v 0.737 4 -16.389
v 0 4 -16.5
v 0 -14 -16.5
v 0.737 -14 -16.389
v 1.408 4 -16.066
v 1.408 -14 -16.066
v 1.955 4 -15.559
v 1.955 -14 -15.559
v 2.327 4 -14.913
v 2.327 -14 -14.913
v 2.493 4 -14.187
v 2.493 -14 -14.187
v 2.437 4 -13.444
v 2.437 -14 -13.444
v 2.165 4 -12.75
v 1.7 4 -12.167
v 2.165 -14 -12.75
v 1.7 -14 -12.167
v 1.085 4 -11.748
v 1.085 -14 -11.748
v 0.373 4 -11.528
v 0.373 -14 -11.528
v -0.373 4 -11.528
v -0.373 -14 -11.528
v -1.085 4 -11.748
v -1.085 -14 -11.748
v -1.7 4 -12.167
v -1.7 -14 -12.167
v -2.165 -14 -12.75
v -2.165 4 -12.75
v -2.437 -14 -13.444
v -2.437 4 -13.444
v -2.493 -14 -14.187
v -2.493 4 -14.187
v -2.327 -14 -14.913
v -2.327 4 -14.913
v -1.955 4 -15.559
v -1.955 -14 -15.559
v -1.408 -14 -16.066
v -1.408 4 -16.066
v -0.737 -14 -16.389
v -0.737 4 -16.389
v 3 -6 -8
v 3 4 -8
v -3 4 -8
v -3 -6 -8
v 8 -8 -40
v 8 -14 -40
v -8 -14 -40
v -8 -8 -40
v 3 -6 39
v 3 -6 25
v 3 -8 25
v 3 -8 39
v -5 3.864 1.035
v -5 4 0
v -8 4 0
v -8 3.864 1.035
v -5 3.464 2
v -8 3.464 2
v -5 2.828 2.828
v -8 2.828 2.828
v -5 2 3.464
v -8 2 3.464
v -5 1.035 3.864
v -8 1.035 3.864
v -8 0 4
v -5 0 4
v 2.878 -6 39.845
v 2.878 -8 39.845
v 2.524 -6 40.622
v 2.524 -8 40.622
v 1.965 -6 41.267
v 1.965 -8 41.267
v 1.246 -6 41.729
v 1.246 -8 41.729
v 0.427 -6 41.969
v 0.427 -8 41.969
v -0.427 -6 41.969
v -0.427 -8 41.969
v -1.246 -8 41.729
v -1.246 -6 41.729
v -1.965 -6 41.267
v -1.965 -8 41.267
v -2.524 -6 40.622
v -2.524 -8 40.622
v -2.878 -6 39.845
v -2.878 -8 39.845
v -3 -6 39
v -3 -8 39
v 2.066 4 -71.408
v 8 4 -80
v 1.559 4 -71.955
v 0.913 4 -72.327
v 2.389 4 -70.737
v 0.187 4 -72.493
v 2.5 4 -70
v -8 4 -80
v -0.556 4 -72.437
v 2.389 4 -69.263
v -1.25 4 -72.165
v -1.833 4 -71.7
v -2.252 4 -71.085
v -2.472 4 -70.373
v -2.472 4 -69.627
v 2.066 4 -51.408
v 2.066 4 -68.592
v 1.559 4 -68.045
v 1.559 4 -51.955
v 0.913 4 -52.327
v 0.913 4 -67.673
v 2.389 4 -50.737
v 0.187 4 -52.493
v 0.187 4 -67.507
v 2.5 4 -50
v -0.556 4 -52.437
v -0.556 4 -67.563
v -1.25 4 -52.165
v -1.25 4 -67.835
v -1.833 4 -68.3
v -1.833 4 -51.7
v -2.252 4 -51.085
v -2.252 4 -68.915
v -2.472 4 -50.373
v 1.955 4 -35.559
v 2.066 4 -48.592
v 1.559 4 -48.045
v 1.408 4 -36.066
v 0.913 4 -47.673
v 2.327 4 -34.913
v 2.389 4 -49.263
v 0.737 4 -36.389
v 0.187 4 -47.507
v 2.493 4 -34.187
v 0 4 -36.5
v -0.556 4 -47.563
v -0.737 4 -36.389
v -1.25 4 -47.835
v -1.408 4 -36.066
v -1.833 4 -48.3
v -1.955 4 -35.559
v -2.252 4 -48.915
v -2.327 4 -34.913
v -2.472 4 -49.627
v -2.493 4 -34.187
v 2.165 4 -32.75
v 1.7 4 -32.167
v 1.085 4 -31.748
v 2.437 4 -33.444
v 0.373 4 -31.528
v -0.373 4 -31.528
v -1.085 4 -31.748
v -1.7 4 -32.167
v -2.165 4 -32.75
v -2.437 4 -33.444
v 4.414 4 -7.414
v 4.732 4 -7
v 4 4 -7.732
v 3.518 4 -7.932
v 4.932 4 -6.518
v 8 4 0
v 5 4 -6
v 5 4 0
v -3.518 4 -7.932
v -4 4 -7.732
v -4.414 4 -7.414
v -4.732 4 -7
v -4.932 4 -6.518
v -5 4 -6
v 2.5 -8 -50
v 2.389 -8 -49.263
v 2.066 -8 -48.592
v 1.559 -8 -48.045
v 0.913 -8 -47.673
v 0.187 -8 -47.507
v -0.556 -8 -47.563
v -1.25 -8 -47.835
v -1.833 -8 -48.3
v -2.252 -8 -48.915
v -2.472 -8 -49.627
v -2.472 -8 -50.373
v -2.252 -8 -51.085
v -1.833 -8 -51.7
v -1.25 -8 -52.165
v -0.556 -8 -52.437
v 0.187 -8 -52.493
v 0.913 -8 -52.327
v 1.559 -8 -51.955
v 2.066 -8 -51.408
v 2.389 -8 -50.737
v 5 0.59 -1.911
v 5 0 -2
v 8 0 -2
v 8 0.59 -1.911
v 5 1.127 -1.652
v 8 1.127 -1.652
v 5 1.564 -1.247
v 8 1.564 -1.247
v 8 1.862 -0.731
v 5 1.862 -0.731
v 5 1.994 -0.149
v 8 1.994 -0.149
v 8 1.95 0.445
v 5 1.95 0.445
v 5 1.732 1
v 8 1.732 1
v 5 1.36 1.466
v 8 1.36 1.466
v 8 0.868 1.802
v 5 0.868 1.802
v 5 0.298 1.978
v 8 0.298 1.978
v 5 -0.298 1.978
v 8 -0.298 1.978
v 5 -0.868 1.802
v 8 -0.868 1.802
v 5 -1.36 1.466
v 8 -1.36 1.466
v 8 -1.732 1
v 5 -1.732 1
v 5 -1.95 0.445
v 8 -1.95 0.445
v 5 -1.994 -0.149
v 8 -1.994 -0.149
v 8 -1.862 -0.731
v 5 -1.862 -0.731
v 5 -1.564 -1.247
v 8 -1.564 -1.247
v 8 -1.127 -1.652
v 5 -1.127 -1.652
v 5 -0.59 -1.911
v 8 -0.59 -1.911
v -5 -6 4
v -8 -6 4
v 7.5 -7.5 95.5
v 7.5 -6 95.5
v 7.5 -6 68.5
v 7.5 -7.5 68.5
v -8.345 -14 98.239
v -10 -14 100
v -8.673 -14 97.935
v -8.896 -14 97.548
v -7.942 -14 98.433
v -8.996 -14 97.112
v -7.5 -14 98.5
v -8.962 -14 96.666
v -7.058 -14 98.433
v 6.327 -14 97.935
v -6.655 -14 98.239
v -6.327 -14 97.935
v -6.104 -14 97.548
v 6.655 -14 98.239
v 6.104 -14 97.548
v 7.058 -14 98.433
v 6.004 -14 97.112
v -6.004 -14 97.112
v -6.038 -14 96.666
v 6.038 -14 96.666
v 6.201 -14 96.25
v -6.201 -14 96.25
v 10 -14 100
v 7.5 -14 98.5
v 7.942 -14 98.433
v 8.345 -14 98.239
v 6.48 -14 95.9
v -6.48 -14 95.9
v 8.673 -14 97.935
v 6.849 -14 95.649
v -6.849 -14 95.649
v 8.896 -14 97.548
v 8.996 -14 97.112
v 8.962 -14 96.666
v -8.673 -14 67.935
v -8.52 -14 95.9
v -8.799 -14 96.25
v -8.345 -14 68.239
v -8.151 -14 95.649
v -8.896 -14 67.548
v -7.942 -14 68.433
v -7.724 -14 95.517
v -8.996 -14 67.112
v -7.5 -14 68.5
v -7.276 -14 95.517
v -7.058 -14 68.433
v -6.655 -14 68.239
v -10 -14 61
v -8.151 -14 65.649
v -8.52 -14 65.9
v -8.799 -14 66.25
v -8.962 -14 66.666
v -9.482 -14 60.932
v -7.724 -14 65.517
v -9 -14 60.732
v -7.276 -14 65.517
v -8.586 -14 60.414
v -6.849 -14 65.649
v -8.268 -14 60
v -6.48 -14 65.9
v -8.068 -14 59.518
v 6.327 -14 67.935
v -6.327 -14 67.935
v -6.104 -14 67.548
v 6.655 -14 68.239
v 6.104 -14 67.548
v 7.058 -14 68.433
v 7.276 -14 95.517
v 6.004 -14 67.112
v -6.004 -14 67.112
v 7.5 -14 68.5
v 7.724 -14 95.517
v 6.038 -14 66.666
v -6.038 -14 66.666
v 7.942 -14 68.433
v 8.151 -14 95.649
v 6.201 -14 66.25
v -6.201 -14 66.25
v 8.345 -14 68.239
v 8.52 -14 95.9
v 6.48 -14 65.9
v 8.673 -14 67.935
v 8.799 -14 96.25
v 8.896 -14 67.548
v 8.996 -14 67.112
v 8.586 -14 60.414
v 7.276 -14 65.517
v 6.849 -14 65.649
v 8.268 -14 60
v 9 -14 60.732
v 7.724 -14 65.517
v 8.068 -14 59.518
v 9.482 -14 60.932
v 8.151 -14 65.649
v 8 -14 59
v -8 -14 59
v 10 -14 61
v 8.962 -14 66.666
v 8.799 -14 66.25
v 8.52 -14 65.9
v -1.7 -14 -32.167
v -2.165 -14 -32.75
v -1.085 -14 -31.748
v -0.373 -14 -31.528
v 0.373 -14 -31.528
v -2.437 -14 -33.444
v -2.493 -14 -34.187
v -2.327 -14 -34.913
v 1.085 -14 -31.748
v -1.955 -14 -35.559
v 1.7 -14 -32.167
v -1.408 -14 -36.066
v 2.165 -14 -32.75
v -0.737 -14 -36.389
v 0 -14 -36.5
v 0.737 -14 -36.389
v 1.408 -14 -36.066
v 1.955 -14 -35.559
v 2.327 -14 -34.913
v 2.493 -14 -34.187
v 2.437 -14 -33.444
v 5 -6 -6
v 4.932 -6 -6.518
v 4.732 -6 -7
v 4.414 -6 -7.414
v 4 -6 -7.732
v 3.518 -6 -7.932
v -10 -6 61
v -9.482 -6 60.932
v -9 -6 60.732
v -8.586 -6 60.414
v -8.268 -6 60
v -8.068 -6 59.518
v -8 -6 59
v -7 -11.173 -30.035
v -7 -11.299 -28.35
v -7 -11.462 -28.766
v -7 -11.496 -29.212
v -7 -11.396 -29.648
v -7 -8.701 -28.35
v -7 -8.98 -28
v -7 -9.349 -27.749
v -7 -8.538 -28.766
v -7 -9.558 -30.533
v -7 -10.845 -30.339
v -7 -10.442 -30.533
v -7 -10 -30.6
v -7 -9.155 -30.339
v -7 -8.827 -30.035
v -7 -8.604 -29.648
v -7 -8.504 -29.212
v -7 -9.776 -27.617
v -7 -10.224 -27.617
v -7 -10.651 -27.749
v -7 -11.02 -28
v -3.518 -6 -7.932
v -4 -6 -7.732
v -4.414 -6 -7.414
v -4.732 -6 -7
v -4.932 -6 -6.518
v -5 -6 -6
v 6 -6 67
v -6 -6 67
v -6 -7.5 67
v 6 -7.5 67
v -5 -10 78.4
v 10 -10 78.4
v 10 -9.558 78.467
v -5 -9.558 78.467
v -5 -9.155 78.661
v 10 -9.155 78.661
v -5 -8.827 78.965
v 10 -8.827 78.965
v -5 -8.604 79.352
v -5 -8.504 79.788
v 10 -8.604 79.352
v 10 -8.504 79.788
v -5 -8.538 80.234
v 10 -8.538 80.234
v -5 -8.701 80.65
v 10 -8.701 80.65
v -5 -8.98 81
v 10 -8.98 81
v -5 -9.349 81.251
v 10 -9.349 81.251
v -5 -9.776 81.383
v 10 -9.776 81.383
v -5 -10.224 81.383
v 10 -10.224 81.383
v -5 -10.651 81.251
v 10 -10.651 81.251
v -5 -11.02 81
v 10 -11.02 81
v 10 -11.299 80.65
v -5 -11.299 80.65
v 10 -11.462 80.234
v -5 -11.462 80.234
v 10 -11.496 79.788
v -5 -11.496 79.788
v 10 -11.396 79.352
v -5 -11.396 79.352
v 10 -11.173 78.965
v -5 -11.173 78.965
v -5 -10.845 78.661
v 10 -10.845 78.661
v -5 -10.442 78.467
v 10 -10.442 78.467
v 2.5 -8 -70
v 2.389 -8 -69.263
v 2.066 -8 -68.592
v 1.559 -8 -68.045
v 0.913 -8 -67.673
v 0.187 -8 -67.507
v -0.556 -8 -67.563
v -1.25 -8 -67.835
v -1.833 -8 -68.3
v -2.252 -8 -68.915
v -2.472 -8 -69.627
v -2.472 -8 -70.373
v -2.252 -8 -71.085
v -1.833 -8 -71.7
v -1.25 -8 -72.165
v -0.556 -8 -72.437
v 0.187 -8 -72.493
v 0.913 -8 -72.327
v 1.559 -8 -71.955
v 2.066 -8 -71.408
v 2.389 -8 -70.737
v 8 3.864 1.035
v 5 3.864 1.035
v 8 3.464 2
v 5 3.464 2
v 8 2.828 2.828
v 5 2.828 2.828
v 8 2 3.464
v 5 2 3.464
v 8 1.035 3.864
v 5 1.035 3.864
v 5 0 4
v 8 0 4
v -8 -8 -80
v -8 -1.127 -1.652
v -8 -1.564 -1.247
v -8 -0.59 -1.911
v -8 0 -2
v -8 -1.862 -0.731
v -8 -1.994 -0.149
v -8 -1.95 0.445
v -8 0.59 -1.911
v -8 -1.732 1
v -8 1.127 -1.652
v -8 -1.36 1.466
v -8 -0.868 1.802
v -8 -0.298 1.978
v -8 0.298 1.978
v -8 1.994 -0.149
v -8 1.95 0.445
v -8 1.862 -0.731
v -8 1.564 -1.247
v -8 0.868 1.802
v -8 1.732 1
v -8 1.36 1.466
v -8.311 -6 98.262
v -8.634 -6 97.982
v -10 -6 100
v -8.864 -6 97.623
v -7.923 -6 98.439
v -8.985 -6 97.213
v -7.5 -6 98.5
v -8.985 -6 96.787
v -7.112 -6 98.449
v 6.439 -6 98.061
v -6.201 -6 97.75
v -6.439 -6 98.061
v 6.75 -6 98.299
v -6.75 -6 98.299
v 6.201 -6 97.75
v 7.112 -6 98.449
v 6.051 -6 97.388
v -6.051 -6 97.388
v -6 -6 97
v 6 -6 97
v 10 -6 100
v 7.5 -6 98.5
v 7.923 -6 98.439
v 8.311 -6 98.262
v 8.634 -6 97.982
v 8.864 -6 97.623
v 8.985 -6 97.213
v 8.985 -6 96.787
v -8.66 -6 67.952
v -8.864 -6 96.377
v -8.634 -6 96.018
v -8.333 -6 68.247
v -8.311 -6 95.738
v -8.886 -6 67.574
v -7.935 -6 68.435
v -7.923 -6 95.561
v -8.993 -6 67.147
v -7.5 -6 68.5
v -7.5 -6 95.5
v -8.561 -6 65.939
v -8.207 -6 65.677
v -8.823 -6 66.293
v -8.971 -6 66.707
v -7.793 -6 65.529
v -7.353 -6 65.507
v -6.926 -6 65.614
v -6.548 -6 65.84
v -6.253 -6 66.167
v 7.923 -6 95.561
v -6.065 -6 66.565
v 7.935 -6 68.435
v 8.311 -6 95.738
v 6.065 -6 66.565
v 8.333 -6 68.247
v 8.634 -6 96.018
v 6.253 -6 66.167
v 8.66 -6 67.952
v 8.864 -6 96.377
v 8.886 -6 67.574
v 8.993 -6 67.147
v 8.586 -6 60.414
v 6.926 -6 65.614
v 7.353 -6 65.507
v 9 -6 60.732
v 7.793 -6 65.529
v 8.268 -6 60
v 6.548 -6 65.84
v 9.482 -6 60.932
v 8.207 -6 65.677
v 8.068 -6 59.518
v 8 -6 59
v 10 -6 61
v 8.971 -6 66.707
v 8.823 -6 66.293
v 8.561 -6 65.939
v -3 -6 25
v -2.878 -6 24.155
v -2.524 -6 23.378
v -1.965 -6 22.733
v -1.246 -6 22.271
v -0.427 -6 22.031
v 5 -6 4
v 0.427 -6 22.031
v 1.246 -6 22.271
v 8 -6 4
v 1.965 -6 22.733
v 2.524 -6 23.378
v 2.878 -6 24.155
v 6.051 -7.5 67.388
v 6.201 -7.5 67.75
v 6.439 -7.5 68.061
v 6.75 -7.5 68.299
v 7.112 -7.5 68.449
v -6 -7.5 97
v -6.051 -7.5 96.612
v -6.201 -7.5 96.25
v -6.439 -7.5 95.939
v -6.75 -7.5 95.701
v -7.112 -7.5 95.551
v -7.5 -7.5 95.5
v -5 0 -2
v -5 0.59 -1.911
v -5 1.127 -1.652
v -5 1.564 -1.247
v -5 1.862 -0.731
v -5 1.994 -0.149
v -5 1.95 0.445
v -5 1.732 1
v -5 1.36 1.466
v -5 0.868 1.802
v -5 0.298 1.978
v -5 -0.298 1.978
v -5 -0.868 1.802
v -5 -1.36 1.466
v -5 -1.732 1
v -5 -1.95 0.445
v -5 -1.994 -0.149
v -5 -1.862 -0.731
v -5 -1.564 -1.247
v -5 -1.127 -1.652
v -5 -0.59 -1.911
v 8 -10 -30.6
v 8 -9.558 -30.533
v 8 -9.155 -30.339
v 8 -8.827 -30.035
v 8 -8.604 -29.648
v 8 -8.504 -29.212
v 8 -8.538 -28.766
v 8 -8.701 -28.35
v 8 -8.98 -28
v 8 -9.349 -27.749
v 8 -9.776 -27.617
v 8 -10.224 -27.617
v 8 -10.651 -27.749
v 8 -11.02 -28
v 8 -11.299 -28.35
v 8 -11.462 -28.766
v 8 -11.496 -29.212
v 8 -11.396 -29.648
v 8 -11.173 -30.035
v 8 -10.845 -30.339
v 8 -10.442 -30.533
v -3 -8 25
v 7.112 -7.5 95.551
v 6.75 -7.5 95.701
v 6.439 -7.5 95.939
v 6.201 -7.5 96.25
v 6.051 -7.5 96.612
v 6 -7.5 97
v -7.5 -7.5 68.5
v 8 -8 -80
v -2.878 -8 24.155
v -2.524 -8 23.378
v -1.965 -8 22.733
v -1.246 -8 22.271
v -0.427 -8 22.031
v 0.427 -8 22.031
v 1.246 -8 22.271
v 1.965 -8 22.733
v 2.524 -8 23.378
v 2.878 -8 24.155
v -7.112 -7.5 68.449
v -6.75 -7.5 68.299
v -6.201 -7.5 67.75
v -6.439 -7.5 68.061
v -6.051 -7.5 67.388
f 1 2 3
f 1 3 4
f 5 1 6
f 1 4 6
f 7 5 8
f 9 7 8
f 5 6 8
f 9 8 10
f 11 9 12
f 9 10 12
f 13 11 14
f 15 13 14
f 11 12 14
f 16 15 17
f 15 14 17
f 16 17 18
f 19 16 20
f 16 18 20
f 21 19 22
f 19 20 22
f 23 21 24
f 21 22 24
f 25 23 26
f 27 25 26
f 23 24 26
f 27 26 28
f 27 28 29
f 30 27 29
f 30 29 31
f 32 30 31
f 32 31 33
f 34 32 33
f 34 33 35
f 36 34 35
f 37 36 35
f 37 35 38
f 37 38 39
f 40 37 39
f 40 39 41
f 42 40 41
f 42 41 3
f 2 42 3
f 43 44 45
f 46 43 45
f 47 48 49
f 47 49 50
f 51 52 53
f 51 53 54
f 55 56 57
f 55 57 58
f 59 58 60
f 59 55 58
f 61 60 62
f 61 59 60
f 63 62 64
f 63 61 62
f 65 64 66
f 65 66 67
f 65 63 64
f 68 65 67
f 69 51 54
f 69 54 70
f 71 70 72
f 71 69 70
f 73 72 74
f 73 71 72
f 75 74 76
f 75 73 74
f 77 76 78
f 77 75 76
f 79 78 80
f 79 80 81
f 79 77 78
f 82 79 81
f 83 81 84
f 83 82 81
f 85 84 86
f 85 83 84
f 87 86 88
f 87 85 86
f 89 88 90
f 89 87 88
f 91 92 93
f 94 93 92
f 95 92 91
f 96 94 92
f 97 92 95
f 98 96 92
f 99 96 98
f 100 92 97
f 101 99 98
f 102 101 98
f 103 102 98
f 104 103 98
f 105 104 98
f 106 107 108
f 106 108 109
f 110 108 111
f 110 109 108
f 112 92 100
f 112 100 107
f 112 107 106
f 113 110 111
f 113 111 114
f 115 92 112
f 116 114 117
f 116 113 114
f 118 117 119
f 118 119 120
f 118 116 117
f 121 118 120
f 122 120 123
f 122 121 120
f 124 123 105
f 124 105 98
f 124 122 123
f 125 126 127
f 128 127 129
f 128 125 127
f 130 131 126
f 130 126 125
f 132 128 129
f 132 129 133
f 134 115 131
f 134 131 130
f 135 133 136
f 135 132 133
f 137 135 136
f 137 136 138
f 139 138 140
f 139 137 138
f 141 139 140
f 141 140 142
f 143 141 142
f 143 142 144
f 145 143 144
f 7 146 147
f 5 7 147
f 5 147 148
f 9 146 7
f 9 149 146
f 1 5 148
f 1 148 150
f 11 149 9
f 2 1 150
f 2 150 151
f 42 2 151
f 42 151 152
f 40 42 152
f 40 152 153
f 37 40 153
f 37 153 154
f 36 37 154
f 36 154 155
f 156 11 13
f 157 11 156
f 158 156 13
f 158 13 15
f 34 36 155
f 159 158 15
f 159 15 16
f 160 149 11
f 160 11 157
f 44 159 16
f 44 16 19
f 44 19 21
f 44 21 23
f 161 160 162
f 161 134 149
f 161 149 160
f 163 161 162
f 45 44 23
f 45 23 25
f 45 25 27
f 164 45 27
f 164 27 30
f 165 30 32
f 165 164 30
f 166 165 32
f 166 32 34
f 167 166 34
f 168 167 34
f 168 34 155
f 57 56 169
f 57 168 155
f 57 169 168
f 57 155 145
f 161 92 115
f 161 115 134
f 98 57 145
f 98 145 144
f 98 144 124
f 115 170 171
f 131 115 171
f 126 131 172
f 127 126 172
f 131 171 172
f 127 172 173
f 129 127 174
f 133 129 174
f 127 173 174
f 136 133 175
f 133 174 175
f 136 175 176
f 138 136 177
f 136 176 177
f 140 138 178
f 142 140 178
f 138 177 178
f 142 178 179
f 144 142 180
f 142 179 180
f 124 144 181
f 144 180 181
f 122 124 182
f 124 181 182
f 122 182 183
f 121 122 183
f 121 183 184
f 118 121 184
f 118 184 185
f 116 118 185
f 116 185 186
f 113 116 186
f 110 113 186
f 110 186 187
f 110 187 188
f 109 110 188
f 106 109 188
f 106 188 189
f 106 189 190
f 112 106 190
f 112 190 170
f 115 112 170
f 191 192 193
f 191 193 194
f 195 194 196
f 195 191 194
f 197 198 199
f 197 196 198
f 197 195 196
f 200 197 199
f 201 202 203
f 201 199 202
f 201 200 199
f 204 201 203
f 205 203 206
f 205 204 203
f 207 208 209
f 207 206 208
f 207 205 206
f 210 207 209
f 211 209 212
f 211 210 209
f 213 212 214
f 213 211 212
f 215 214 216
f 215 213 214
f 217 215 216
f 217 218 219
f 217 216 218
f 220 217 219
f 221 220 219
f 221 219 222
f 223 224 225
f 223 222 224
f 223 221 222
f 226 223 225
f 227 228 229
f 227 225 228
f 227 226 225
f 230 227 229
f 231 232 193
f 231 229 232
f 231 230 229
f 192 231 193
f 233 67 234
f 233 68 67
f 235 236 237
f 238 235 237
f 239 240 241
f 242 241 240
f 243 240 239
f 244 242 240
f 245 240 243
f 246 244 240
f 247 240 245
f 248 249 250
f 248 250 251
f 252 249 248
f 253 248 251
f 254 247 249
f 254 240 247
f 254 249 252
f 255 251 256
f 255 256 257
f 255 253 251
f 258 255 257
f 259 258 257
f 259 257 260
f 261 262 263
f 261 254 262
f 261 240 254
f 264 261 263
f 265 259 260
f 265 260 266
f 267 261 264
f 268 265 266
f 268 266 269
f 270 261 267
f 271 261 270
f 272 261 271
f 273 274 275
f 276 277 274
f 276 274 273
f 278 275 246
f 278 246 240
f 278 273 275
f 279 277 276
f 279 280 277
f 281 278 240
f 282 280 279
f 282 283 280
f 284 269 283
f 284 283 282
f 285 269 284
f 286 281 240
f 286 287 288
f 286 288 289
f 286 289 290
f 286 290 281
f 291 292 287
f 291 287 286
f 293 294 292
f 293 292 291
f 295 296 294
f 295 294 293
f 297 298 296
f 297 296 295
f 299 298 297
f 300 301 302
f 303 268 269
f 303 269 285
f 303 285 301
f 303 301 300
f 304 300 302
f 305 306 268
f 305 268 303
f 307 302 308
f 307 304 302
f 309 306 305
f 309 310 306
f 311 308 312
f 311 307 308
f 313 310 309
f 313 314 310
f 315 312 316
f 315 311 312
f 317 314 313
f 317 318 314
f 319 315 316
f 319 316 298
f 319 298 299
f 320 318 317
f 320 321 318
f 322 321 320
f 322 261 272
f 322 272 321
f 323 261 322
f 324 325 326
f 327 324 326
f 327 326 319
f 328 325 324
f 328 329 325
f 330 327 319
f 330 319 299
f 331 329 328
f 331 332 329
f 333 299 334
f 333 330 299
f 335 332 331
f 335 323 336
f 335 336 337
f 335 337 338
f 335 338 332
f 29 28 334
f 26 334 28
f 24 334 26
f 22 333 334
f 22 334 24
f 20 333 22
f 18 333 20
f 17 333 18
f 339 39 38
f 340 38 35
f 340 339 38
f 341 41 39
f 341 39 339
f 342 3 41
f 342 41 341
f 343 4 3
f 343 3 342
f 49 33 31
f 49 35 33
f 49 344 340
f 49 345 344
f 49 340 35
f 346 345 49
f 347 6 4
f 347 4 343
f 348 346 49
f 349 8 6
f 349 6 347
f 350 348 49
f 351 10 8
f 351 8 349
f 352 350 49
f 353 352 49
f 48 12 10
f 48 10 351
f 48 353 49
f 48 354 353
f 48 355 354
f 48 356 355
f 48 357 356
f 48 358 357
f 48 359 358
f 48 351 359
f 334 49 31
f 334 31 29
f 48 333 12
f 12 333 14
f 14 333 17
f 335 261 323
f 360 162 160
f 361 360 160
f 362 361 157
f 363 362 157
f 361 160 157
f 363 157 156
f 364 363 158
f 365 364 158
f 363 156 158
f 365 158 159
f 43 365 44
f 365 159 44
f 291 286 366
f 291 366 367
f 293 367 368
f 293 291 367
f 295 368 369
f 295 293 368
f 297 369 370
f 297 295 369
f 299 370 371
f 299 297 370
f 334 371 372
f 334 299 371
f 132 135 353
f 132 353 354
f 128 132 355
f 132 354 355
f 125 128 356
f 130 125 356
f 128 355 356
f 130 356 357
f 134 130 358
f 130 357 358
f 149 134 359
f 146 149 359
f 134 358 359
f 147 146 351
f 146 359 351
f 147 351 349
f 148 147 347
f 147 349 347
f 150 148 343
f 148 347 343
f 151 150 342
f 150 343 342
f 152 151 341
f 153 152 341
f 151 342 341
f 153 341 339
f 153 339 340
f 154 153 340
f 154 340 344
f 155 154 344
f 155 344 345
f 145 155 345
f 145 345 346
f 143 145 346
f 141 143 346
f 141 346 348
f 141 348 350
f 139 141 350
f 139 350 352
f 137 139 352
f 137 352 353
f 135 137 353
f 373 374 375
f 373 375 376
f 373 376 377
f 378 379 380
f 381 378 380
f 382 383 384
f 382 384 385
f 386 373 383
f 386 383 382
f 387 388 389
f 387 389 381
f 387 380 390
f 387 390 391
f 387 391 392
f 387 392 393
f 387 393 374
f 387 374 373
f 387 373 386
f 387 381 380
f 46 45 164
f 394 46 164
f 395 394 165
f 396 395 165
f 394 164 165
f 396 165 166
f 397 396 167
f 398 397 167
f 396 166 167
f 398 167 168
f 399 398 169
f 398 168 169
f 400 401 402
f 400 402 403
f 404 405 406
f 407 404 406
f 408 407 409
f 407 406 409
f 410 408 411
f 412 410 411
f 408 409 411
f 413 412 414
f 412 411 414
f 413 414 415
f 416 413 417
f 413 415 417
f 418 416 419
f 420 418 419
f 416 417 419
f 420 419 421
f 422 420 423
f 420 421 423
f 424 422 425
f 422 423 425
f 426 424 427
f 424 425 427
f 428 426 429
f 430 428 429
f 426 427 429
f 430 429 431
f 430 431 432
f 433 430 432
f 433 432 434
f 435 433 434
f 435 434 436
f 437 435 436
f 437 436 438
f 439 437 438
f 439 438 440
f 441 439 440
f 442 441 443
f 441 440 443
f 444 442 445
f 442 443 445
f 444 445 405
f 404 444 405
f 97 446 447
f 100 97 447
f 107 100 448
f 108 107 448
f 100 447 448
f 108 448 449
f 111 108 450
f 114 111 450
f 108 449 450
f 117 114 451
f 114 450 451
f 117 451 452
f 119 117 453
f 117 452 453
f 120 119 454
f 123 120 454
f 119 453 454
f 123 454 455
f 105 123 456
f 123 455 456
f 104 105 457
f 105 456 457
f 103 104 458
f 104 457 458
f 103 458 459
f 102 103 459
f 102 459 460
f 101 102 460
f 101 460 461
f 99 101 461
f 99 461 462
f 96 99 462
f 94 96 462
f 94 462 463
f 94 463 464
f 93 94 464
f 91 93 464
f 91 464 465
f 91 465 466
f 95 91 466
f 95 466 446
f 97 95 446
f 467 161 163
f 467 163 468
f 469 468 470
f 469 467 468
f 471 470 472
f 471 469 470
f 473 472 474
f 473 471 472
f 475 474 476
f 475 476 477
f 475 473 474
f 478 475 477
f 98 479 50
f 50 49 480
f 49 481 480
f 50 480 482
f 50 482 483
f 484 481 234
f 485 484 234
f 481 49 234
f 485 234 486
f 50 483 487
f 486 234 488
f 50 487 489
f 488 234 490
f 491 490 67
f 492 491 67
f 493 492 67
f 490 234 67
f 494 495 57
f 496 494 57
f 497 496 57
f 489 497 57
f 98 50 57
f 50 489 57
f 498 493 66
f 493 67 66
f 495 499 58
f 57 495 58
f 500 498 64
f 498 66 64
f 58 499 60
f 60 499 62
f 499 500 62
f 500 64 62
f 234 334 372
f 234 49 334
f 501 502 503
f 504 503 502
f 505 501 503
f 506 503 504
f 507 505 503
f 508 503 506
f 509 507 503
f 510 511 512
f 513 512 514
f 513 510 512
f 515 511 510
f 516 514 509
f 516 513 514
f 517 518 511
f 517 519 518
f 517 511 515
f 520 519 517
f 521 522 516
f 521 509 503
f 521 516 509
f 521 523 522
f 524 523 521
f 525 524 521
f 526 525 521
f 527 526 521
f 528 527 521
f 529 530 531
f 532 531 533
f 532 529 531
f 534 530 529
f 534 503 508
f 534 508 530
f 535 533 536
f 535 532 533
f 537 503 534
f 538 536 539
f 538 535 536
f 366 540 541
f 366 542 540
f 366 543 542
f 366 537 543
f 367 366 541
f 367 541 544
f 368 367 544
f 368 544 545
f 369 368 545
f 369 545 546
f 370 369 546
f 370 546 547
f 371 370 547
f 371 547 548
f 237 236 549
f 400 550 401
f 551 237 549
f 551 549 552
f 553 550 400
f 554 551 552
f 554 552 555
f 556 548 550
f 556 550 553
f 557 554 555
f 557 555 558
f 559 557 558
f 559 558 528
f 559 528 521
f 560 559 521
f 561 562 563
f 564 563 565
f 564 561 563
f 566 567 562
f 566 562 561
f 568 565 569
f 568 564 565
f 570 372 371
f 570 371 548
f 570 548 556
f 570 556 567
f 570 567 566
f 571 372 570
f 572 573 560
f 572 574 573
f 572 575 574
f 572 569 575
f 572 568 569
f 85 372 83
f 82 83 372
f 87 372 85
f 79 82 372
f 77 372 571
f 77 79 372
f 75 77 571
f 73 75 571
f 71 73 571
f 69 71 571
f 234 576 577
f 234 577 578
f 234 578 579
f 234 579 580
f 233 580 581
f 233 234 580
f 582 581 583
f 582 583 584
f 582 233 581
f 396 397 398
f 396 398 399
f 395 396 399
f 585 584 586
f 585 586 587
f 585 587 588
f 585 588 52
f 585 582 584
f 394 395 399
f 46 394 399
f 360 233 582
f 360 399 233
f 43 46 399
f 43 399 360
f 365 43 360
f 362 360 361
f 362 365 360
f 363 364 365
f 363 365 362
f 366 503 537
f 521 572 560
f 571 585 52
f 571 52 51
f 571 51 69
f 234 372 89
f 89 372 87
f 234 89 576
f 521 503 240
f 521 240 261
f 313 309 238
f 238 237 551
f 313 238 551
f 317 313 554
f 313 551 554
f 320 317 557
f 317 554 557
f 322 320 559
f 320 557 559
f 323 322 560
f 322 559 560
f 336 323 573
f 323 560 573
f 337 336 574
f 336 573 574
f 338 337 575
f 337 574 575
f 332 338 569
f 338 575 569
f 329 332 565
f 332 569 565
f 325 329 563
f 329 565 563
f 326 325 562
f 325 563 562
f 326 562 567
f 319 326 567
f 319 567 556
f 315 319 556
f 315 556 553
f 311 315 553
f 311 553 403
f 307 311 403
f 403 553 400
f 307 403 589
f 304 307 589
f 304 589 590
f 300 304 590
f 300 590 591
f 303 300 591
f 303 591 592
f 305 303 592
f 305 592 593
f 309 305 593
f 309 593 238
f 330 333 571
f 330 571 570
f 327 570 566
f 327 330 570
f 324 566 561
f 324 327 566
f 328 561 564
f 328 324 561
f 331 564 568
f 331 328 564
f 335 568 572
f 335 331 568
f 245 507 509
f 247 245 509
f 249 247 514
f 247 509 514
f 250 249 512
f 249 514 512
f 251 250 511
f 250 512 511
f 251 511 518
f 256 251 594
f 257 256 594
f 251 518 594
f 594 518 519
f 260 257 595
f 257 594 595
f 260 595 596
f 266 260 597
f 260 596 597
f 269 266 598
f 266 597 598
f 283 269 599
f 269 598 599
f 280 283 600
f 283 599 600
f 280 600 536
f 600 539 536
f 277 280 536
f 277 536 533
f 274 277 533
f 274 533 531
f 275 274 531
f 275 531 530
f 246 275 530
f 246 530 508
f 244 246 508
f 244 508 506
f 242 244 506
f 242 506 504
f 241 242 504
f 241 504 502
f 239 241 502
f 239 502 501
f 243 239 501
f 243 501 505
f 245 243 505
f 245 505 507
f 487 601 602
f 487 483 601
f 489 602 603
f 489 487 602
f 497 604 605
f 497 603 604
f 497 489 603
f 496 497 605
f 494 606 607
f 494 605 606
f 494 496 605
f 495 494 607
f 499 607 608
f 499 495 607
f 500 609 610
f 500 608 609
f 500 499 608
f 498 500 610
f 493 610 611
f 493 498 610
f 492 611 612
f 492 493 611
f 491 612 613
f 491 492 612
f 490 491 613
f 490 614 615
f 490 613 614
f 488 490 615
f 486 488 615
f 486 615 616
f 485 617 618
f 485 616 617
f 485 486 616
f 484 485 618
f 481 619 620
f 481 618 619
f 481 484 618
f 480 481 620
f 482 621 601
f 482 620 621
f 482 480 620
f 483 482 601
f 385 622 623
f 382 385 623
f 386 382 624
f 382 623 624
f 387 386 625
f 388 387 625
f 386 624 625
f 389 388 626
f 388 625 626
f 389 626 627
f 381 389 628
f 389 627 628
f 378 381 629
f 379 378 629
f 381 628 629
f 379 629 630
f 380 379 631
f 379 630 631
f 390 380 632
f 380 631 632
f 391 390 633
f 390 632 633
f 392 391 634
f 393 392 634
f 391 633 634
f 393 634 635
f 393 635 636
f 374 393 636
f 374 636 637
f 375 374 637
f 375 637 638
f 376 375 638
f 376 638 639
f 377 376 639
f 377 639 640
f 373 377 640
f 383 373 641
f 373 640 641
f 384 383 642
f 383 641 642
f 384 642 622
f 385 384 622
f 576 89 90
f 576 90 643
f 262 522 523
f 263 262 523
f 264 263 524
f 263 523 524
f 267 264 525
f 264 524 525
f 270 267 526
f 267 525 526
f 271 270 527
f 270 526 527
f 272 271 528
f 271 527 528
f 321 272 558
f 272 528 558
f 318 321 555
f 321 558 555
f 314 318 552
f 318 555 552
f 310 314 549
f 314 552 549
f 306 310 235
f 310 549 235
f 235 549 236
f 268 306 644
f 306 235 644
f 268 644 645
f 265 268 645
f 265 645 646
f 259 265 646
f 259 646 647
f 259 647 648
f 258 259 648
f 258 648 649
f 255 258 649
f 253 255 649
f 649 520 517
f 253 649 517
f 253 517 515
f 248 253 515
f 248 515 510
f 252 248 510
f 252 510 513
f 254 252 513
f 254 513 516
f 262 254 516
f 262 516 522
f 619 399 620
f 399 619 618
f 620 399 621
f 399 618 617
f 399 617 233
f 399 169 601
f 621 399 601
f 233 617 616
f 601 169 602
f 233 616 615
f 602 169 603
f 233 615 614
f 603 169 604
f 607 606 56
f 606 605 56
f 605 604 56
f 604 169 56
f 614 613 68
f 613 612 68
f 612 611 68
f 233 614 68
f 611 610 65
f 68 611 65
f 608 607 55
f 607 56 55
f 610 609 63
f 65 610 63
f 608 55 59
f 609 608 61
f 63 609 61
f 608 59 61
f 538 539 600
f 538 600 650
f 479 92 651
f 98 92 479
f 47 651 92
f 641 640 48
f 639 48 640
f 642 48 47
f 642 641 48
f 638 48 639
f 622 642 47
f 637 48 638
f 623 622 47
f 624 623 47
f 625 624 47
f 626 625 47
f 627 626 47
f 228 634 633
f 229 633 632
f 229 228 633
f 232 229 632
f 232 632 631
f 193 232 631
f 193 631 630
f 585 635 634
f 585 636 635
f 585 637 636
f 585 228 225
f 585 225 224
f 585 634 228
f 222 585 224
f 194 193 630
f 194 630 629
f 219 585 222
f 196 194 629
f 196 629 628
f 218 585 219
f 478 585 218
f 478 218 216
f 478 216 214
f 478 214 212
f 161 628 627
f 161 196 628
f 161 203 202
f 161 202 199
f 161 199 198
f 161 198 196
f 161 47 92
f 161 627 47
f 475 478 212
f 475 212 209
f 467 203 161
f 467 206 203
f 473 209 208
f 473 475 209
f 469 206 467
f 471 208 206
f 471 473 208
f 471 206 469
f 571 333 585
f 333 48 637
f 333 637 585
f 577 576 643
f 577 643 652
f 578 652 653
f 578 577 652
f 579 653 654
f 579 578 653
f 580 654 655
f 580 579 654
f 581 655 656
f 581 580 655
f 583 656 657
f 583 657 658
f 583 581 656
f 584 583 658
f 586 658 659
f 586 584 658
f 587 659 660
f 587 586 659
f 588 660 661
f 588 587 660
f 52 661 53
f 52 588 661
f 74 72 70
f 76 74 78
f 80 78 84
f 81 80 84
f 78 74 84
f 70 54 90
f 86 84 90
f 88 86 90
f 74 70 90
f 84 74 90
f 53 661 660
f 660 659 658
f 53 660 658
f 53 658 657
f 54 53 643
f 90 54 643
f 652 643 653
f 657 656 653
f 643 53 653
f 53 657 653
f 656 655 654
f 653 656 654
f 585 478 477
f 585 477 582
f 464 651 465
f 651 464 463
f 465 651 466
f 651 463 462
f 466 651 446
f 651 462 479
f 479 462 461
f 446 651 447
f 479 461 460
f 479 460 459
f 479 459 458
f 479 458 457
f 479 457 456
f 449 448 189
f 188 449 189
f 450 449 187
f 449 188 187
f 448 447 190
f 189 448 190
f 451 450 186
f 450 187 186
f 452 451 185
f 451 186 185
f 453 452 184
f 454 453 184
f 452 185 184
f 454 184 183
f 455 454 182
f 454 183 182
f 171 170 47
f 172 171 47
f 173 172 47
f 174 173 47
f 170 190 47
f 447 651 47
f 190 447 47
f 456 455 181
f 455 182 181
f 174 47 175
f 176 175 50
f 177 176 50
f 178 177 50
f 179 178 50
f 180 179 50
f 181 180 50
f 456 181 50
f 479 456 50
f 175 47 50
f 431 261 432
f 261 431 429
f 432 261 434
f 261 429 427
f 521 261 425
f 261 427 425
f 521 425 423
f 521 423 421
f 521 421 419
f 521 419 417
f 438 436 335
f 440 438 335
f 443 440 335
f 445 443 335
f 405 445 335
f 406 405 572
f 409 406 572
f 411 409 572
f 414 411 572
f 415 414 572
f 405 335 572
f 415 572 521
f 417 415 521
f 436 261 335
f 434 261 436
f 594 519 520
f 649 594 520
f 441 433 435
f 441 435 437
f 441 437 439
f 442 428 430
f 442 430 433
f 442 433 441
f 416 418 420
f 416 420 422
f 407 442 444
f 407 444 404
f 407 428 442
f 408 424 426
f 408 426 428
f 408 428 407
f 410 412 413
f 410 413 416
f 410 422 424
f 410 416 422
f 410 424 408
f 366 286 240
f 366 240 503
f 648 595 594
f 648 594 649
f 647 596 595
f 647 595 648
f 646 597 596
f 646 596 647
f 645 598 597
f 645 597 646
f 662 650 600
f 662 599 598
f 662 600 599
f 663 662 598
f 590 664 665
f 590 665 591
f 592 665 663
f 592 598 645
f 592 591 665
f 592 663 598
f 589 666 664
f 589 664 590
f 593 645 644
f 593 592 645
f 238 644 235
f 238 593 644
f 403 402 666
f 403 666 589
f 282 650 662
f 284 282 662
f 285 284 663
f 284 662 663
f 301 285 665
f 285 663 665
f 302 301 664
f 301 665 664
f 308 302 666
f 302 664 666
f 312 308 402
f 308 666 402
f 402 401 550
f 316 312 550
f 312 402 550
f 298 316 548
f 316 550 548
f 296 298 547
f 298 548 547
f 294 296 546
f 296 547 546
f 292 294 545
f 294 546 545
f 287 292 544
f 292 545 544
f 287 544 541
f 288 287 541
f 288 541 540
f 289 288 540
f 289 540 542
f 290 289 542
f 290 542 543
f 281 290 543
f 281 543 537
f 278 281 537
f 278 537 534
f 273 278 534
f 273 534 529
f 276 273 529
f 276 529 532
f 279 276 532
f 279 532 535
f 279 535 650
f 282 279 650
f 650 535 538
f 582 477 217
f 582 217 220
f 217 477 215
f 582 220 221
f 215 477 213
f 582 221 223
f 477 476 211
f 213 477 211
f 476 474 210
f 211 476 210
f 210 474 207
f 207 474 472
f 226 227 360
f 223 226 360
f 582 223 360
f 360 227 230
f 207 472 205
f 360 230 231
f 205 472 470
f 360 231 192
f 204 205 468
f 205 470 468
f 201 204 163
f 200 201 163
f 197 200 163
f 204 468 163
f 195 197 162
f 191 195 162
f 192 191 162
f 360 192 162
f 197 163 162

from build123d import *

# Parameters (mm, degrees)
SKETCH1_W               = 140
SKETCH1_H               = 6
BOSS_EXTRUDE1_DEPTH     = 10
SKETCH2_R               = 2
BOSS_EXTRUDE2_DEPTH     = 10
SKETCH6_W               = 2
SKETCH6_H               = 12
CUT_EXTRUDE3_DEPTH      = 98.529482722
CUT_EXTRUDE4_DEPTH      = 10
SKETCH8_W               = 16
SKETCH8_H               = 2
BOSS_EXTRUDE3_DEPTH     = 15
SKETCH9_W               = 20
SKETCH9_H               = 2
BOSS_EXTRUDE4_DEPTH     = 81
CUT_EXTRUDE6_DEPTH      = 102.212647431
CUT_EXTRUDE6_DEPTH_BACK = 102.212647431
SKETCH12_W              = 16
SKETCH12_H              = 12
BOSS_EXTRUDE5_DEPTH     = 40
SKETCH13_R              = 1.5
CUT_EXTRUDE7_DEPTH      = 101.995049384
SKETCH14_W              = 15
SKETCH14_H              = 30
CUT_EXTRUDE8_DEPTH      = 1.5
CUT_EXTRUDE9_DEPTH      = 2
SKETCH16_R              = 2.5
CUT_EXTRUDE10_DEPTH     = 103.097992145
SKETCH17_R              = 2.5
CUT_EXTRUDE11_DEPTH     = 102.212647431
SKETCH18_R              = 1.5
CUT_EXTRUDE12_DEPTH     = 15
SKETCH19_R              = 1.5
CUT_EXTRUDE13_DEPTH     = 15


with BuildPart() as part:
    # Sketch1 → Boss-Extrude1 (new, symmetric)
    with BuildSketch(Plane(origin=(0, 0, 0), x_dir=(0, 0, -1), z_dir=(1, 0, 0))):
        with Locations((-30, -11)):
            Rectangle(SKETCH1_W, SKETCH1_H)
    extrude(amount=BOSS_EXTRUDE1_DEPTH, both=True)

    # Sketch2 → Boss-Extrude2 (add, symmetric)
    with BuildSketch(Plane(origin=(0, 0, 0), x_dir=(0, 0, -1), z_dir=(1, 0, 0))):
        with BuildLine():
            Line((-4, -8), (4, -8))
            Line((4, -8), (40, -8))
            Line((40, -8), (40, 4))
            Line((40, 4), (0, 4))
            ThreePointArc((0, 4), (-2.828427125, 2.828427125), (-4, 0))
            Line((-4, 0), (-4, -8))
        make_face()
        Circle(SKETCH2_R, mode=Mode.SUBTRACT)
    extrude(amount=BOSS_EXTRUDE2_DEPTH, both=True)

    # Sketch6 → Cut-Extrude3 (cut, through all)
    with BuildSketch(Plane.XY.offset(4)):
        with Locations((-9, -2)):
            Rectangle(SKETCH6_W, SKETCH6_H)
        with Locations((9, -2)):
            Rectangle(SKETCH6_W, SKETCH6_H)
    extrude(amount=-CUT_EXTRUDE3_DEPTH, mode=Mode.SUBTRACT)

    # Sketch7 → Cut-Extrude4 (cut)
    with BuildSketch(Plane(origin=(0, 4, 0), x_dir=(1, 0, 0), z_dir=(0, 1, 0))):
        with BuildLine():
            Line((-5, -4), (5, -4))
            Line((5, -4), (5, 6))
            ThreePointArc((5, 6), (4.414213562, 7.414213562), (3, 8))
            Line((3, 8), (-3, 8))
            ThreePointArc((-3, 8), (-4.414213562, 7.414213562), (-5, 6))
            Line((-5, 6), (-5, -4))
        make_face()
    extrude(amount=-CUT_EXTRUDE4_DEPTH, mode=Mode.SUBTRACT)

    # Sketch8 → Boss-Extrude3 (add)
    with BuildSketch(Plane.XY.offset(4)):
        with Locations((0, -7)):
            Rectangle(SKETCH8_W, SKETCH8_H)
    extrude(amount=BOSS_EXTRUDE3_DEPTH)

    # Sketch9 → Boss-Extrude4 (add)
    with BuildSketch(Plane.XY.offset(19)):
        with Locations((0, -7)):
            Rectangle(SKETCH9_W, SKETCH9_H)
    extrude(amount=BOSS_EXTRUDE4_DEPTH)

    # Sketch11 → Cut-Extrude6 (cut, two sides: drawn at the far end of the back side and taken through both)
    with BuildSketch(Plane(origin=(0, -8, 0), x_dir=(1, 0, 0), z_dir=(0, 1, 0)).offset(-CUT_EXTRUDE6_DEPTH_BACK)):
        with BuildLine():
            Line((-10, -59), (-10, -61))
            ThreePointArc((-10, -61), (-8.585786438, -60.414213562), (-8, -59))
            Line((-8, -59), (-8, 40))
            Line((-8, 40), (-10, 40))
            Line((-10, 40), (-10, -59))
        make_face()
        with BuildLine():
            Line((10, 40), (8, 40))
            Line((8, 40), (8, -59))
            ThreePointArc((8, -59), (8.585786438, -60.414213562), (10, -61))
            Line((10, -61), (10, -59))
            Line((10, -59), (10, 40))
        make_face()
    extrude(amount=CUT_EXTRUDE6_DEPTH + CUT_EXTRUDE6_DEPTH_BACK, mode=Mode.SUBTRACT)

    # Sketch12 → Boss-Extrude5 (add)
    with BuildSketch(Plane(origin=(0, 0, -40), x_dir=(-1, 0, 0), z_dir=(0, 0, -1))):
        with Locations((0, -2)):
            Rectangle(SKETCH12_W, SKETCH12_H)
    extrude(amount=BOSS_EXTRUDE5_DEPTH)

    # Sketch13 → Cut-Extrude7 (cut, through all)
    with BuildSketch(Plane(origin=(0, -6, 0), x_dir=(1, 0, 0), z_dir=(0, 1, 0))):
        with Locations(Location((7.5, -97, 0), (0, 0, 270))):
            Circle(SKETCH13_R)
        with Locations(Location((7.5, -67, 0), (0, 0, 270))):
            Circle(SKETCH13_R)
        with Locations(Location((-7.5, -67, 0), (0, 0, 270))):
            Circle(SKETCH13_R)
        with Locations(Location((-7.5, -97, 0), (0, 0, 270))):
            Circle(SKETCH13_R)
    extrude(amount=-CUT_EXTRUDE7_DEPTH, mode=Mode.SUBTRACT)

    # Sketch14 → Cut-Extrude8 (cut)
    with BuildSketch(Plane(origin=(0, -6, 0), x_dir=(1, 0, 0), z_dir=(0, 1, 0))):
        with Locations((0, -82)):
            Rectangle(SKETCH14_W, SKETCH14_H)
    extrude(amount=-CUT_EXTRUDE8_DEPTH, mode=Mode.SUBTRACT)

    # Sketch15 → Cut-Extrude9 (cut)
    with BuildSketch(Plane(origin=(0, -6, 0), x_dir=(1, 0, 0), z_dir=(0, 1, 0))):
        with BuildLine():
            Line((3, -25), (3, -39))
            ThreePointArc((3, -39), (0, -42), (-3, -39))
            Line((-3, -39), (-3, -25))
            ThreePointArc((-3, -25), (0, -22), (3, -25))
        make_face()
    extrude(amount=-CUT_EXTRUDE9_DEPTH, mode=Mode.SUBTRACT)

    # Sketch16 → Cut-Extrude10 (cut, through all)
    with BuildSketch(Plane.XZ.offset(14)):
        with Locations(Location((0, -34, 0), (0, 0, 270))):
            Circle(SKETCH16_R)
        with Locations(Location((0, -14, 0), (0, 0, 270))):
            Circle(SKETCH16_R)
    extrude(amount=-CUT_EXTRUDE10_DEPTH, mode=Mode.SUBTRACT)

    # Sketch17 → Cut-Extrude11 (cut, through all)
    with BuildSketch(Plane.XZ.offset(8)):
        with Locations((0, -70)):
            Circle(SKETCH17_R)
        with Locations((0, -50)):
            Circle(SKETCH17_R)
    extrude(amount=-CUT_EXTRUDE11_DEPTH, mode=Mode.SUBTRACT)

    # Sketch18 → Cut-Extrude12 (cut)
    with BuildSketch(Plane(origin=(8, 0, 0), x_dir=(0, 0, -1), z_dir=(1, 0, 0))):
        with Locations((29.1, -10)):
            Circle(SKETCH18_R)
    extrude(amount=-CUT_EXTRUDE12_DEPTH, mode=Mode.SUBTRACT)

    # Sketch19 → Cut-Extrude13 (cut)
    with BuildSketch(Plane(origin=(10, 0, 0), x_dir=(0, 0, -1), z_dir=(1, 0, 0))):
        with Locations((-79.9, -10)):
            Circle(SKETCH19_R)
    extrude(amount=-CUT_EXTRUDE13_DEPTH, mode=Mode.SUBTRACT)


solid = part.part
